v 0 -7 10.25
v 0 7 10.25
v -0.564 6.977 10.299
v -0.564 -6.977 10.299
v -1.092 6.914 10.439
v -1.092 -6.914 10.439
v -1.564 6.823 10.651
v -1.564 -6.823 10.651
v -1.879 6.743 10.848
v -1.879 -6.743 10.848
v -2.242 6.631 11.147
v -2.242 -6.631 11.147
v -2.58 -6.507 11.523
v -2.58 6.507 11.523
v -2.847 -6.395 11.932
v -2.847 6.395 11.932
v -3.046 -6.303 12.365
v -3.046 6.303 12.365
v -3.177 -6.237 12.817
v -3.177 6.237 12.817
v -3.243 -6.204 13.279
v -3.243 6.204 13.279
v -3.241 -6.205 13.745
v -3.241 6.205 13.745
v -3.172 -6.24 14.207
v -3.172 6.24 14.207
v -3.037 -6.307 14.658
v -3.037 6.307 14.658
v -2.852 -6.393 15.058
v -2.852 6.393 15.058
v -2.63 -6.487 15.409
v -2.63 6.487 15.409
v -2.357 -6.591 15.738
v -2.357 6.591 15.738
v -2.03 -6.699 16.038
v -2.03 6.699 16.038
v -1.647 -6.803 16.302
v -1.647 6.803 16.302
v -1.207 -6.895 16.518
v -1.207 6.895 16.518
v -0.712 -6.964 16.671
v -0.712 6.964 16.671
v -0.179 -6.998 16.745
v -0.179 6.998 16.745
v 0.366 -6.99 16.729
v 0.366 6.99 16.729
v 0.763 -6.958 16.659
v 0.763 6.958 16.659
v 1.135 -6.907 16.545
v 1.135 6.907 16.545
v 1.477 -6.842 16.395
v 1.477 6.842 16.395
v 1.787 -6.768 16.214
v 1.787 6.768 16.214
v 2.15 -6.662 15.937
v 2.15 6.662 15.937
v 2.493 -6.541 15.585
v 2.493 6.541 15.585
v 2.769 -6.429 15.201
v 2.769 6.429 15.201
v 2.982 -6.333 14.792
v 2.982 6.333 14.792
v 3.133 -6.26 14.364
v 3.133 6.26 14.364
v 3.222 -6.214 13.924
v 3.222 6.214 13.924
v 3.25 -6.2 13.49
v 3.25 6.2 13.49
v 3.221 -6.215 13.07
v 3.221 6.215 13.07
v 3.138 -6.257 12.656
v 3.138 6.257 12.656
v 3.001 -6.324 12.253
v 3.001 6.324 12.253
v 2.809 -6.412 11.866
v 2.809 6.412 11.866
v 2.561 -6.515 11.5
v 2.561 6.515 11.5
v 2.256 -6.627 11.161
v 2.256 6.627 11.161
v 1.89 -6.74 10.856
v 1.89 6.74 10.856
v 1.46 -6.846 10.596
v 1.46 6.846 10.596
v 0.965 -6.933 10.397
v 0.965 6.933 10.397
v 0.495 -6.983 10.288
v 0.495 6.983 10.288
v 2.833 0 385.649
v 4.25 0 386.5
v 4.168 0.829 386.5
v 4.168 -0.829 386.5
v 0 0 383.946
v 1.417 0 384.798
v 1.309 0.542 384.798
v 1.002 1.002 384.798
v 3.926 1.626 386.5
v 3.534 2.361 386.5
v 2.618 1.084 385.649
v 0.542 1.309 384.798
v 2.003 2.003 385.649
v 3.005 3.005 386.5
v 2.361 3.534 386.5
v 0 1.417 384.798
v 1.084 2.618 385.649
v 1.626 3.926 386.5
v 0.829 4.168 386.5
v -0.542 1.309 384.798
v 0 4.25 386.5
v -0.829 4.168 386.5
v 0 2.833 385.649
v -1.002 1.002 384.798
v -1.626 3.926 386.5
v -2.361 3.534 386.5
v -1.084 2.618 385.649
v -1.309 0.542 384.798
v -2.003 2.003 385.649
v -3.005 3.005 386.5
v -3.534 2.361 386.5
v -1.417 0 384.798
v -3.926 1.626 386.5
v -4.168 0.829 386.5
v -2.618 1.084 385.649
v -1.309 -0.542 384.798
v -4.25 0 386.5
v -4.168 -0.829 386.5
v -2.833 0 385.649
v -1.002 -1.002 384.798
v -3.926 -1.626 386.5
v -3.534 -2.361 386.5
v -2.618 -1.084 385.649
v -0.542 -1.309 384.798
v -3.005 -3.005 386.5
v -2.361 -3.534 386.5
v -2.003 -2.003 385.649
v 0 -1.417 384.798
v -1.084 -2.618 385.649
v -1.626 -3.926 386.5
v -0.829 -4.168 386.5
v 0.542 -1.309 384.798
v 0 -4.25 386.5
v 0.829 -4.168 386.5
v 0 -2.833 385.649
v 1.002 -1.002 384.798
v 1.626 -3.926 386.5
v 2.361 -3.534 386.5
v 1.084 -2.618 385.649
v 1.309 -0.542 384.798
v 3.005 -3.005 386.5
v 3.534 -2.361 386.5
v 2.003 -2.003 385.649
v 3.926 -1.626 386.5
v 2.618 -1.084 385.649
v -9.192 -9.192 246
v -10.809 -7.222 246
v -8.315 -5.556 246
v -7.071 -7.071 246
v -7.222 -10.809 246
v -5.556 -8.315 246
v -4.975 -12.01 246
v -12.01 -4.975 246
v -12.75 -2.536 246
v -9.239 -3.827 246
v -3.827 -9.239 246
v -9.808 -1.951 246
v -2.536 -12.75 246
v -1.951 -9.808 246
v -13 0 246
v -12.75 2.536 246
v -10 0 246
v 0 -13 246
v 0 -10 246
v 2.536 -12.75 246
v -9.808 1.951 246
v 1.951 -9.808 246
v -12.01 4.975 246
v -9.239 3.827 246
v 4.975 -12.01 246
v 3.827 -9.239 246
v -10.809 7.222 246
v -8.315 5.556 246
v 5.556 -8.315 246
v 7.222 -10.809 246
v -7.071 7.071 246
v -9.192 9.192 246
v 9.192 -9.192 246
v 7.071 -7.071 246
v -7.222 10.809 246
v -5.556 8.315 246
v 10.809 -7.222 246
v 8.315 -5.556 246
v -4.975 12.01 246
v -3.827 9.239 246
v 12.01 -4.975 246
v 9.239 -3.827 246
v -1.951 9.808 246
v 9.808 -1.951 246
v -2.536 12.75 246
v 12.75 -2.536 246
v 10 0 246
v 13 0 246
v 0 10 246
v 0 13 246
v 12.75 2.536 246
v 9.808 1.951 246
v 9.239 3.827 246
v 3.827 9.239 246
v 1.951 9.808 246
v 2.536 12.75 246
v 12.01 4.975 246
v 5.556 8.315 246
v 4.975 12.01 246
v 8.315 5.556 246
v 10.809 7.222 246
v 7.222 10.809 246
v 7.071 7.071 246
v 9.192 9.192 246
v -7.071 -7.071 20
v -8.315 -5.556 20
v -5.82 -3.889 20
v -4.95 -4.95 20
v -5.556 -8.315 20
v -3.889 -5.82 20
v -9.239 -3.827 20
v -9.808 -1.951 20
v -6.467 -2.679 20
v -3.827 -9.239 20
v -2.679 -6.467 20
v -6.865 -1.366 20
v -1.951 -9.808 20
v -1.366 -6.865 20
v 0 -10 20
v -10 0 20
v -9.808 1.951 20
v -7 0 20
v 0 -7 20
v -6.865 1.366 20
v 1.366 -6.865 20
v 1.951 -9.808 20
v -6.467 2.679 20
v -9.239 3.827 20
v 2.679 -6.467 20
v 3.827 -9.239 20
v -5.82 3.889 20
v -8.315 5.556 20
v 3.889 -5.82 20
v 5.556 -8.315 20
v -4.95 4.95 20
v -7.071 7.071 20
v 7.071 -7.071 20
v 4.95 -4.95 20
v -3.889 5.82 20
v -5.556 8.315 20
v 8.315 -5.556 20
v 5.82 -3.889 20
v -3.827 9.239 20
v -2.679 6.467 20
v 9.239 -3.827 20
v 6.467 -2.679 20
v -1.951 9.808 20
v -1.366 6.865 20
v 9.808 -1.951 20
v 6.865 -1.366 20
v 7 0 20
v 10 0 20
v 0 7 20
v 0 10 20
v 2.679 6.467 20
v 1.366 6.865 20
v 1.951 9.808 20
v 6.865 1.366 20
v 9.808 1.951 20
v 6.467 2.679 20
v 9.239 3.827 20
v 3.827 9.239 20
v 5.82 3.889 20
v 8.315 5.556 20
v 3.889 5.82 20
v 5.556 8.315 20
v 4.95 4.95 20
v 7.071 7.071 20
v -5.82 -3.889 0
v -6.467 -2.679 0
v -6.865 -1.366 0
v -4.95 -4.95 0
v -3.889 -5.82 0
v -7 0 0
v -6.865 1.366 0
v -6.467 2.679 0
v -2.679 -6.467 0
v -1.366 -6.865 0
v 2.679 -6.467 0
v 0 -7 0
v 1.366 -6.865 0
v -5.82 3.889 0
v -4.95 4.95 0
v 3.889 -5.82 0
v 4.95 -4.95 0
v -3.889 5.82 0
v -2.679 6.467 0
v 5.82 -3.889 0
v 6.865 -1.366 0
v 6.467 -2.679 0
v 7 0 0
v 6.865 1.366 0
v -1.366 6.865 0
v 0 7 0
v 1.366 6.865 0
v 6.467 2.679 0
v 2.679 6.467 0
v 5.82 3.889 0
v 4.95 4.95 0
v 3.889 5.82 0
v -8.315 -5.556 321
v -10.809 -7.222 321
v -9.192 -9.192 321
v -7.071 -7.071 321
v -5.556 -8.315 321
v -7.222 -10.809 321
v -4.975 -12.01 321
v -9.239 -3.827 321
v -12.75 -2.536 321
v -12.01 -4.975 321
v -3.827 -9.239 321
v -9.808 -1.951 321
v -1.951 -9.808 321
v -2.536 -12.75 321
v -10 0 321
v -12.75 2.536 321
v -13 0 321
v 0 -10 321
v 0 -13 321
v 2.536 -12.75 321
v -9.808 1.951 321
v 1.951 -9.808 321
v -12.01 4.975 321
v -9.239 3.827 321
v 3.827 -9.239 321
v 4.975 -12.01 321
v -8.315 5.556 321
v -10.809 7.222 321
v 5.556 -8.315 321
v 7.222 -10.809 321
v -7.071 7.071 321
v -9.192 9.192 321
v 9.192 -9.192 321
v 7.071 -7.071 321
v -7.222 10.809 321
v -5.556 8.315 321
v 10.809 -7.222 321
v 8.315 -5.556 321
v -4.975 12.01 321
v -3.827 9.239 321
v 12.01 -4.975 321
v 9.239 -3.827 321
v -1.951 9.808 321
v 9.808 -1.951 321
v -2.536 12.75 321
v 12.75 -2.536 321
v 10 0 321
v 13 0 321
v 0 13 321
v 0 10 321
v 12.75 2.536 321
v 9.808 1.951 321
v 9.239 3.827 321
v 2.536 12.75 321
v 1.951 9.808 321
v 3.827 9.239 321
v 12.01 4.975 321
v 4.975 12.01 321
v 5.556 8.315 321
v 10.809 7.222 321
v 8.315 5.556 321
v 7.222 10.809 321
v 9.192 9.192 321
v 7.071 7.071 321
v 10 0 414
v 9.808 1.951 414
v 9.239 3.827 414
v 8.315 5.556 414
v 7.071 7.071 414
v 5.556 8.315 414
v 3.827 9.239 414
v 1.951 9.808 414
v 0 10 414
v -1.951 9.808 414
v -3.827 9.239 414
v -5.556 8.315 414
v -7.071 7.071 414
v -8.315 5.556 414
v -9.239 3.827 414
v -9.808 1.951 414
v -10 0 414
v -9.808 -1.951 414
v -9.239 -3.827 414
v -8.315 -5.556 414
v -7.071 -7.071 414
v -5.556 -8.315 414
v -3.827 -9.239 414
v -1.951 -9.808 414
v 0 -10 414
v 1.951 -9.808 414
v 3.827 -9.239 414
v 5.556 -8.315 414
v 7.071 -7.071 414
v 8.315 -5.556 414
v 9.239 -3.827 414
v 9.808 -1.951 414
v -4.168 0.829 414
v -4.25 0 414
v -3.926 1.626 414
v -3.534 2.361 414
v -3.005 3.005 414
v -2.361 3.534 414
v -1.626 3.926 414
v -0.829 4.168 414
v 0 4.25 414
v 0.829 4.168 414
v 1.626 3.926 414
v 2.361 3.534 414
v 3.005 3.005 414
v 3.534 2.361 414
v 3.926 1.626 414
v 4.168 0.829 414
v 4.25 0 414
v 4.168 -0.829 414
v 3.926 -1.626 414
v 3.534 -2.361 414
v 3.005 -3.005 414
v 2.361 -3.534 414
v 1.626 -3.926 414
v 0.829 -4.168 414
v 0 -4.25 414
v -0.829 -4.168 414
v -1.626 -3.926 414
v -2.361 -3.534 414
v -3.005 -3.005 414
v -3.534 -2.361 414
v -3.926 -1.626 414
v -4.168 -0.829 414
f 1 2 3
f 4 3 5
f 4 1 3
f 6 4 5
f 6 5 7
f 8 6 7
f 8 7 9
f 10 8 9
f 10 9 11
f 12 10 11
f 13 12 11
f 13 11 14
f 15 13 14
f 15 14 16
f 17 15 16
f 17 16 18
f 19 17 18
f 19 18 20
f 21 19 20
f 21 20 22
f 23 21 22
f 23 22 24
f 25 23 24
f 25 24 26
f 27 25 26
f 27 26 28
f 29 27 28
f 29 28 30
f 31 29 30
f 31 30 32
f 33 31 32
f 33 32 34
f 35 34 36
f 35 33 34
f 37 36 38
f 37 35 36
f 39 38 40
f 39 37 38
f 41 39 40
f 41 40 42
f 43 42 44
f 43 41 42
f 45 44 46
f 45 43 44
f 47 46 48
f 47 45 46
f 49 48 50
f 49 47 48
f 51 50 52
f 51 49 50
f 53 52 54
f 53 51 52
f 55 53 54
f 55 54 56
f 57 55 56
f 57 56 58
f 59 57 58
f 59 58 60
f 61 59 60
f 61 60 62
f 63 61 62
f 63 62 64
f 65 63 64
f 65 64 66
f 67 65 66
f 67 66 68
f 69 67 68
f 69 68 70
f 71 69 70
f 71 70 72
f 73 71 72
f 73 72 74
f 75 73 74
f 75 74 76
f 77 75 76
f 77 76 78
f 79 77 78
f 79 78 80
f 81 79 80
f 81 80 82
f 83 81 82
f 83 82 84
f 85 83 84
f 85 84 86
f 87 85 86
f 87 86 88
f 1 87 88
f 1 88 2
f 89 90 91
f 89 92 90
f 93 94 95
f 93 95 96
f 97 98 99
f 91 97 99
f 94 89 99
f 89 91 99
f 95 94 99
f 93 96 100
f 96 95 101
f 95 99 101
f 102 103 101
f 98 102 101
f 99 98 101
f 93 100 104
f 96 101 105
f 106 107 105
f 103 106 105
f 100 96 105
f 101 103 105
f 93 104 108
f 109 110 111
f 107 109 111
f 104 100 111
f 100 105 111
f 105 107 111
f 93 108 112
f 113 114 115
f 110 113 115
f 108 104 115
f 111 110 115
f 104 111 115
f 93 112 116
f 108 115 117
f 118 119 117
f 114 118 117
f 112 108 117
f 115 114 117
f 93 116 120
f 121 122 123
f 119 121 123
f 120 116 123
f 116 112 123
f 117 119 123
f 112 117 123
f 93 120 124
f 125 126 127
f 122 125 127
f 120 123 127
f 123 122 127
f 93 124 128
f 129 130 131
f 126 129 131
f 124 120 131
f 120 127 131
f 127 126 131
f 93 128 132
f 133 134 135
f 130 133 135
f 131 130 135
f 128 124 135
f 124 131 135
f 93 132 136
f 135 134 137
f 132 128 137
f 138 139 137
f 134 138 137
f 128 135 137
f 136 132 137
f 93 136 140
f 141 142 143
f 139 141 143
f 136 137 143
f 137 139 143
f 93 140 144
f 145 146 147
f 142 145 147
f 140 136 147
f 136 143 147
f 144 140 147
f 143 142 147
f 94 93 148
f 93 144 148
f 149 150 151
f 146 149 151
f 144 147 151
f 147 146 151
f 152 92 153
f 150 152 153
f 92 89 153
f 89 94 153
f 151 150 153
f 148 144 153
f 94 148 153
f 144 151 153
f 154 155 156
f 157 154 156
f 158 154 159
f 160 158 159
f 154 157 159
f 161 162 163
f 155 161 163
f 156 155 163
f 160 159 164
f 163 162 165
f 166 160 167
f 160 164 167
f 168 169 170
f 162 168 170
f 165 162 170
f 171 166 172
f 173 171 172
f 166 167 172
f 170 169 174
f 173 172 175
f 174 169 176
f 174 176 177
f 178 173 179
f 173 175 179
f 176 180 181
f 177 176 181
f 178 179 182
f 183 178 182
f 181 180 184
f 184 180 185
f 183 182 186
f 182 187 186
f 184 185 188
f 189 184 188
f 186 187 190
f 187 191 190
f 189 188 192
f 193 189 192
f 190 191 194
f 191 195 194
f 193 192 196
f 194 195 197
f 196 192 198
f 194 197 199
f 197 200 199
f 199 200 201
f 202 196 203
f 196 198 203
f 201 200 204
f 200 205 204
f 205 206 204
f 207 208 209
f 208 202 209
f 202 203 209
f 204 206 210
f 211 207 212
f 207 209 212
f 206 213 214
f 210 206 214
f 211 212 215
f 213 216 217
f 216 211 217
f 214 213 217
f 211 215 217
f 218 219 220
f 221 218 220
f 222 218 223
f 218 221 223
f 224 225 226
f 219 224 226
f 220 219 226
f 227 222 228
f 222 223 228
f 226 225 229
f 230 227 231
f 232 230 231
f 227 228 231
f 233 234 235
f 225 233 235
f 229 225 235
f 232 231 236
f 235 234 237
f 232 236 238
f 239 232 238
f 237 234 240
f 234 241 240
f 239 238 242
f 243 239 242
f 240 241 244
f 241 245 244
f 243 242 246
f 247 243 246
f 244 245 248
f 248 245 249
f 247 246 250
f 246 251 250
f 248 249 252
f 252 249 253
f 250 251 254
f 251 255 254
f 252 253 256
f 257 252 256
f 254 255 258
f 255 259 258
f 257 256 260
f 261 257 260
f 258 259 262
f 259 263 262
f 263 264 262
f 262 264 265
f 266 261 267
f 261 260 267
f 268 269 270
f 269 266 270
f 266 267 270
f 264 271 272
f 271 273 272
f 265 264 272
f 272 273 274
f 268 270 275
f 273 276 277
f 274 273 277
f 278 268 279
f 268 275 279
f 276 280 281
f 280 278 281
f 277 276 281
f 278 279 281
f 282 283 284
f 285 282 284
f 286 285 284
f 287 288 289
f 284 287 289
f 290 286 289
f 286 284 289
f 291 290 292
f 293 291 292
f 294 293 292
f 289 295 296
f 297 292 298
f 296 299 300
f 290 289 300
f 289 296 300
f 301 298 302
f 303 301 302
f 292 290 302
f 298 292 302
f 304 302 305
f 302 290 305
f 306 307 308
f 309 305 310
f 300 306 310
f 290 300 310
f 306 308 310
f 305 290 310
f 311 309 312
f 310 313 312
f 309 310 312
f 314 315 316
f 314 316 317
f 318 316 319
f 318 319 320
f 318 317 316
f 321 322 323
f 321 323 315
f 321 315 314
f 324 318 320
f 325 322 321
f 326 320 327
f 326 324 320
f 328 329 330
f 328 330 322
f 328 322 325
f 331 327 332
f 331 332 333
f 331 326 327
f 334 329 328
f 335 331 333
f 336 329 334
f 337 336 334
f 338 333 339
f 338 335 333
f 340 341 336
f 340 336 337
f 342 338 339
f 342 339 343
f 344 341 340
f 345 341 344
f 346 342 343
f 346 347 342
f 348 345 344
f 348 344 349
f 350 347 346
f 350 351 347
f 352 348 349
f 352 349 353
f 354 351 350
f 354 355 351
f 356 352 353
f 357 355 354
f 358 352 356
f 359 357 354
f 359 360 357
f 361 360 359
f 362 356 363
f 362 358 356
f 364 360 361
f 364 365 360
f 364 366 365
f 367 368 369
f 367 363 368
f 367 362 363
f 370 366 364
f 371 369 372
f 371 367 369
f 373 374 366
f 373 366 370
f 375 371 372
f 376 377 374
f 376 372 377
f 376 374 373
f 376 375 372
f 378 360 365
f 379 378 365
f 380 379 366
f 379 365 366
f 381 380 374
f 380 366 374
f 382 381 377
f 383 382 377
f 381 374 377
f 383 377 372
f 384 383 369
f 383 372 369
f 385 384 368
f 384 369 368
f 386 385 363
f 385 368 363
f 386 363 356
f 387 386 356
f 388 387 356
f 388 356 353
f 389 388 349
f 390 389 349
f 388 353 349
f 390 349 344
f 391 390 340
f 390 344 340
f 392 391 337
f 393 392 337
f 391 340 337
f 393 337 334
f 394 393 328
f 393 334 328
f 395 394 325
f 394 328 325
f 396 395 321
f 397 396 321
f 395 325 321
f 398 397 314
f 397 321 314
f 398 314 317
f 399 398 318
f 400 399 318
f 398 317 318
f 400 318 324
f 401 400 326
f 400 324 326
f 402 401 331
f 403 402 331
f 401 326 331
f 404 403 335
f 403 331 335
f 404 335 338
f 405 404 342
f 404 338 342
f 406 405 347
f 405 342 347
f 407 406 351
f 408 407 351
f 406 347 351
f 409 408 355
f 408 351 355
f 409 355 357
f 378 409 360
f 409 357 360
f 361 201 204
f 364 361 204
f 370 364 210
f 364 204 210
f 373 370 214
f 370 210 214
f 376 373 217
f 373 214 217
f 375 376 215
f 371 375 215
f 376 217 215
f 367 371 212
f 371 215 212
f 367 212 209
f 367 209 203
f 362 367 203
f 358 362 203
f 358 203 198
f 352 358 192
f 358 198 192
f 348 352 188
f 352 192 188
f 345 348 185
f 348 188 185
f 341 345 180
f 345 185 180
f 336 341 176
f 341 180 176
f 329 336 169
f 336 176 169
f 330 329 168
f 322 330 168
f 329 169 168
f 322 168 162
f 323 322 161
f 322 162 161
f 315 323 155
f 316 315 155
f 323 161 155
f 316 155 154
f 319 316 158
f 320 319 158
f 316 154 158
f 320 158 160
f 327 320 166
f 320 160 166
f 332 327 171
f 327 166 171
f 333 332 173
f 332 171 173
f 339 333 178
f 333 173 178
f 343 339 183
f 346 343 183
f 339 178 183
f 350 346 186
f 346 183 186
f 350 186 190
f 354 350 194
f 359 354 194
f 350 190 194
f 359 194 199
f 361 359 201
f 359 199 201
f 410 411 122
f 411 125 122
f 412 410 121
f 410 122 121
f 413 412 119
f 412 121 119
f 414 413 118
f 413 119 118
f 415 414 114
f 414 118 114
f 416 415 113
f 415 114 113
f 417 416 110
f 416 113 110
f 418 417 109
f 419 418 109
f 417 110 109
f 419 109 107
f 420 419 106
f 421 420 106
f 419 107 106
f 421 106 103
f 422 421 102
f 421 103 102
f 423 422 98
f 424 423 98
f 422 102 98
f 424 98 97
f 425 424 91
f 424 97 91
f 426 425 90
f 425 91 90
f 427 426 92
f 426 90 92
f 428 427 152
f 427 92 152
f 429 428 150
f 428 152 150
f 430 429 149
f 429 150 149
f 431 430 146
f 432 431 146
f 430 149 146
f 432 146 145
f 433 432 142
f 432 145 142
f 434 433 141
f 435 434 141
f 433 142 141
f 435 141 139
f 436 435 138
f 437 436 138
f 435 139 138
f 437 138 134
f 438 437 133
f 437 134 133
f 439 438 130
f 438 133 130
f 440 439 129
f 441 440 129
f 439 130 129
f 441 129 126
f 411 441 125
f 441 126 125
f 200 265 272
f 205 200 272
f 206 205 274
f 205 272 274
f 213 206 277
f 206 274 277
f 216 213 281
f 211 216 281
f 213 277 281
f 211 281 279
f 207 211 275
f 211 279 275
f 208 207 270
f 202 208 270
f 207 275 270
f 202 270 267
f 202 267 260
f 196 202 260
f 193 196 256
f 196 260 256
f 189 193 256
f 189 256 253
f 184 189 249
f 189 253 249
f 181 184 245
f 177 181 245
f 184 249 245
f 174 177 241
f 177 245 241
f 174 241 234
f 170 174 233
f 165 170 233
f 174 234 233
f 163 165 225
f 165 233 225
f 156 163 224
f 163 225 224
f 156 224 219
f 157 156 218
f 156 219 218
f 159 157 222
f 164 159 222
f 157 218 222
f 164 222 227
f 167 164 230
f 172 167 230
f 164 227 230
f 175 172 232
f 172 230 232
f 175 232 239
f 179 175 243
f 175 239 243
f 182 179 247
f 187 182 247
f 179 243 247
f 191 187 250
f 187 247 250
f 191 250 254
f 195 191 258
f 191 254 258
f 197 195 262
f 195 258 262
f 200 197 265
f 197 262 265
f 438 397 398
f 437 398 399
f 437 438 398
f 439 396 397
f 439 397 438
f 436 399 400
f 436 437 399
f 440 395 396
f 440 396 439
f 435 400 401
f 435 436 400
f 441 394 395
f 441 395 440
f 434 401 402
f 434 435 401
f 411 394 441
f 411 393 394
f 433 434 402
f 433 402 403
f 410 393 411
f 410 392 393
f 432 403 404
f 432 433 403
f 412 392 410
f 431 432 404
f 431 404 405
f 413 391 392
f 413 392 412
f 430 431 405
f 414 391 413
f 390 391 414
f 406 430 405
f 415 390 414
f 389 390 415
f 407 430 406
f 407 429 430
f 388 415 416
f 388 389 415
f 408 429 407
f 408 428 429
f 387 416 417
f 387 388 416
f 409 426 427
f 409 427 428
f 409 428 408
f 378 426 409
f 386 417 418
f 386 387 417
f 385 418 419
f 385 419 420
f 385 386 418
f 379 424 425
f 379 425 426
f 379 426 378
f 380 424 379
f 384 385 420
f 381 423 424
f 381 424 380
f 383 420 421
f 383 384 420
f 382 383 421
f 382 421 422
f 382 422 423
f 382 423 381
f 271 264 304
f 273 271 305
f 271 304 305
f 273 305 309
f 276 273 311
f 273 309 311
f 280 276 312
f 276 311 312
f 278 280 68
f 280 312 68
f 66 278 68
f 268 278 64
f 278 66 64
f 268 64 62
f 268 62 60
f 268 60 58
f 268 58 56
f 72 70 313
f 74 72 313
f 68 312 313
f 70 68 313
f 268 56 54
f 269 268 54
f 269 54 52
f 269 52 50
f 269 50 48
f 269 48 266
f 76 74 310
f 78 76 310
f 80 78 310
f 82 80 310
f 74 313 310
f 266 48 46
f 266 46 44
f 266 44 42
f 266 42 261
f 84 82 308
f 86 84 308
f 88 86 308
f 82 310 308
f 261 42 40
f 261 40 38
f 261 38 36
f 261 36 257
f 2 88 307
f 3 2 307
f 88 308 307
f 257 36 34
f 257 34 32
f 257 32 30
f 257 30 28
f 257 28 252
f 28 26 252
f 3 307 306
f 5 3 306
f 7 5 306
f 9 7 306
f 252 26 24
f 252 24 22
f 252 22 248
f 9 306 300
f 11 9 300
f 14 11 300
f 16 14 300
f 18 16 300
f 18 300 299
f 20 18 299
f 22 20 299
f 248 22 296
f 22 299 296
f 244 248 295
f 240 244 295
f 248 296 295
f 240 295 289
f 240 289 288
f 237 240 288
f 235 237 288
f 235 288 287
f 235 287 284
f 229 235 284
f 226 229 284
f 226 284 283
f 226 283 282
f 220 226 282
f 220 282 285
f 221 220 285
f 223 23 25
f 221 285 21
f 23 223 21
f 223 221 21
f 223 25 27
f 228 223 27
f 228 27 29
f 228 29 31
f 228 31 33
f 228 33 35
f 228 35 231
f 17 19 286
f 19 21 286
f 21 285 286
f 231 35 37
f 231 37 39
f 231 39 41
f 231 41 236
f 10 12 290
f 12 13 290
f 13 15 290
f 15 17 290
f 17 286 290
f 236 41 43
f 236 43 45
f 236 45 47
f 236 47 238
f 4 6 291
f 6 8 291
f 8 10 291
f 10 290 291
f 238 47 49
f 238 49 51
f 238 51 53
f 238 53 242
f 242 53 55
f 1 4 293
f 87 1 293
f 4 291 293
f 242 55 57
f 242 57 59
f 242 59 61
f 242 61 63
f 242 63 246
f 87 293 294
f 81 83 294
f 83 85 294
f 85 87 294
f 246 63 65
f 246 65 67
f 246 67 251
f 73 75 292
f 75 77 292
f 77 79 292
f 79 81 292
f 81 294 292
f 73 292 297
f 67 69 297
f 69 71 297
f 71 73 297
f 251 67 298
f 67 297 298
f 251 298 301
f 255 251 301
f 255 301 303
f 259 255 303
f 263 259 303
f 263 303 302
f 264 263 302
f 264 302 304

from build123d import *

# Parameters (mm, degrees)
SCHIZZO1_R                    = 7
ESTRUSIONE1_DEPTH             = 20
SCHIZZO2_R                    = 10
ESTRUSIONE2_DEPTH             = 226
SCHIZZO6_R                    = 13
ESTRUSIONE_ESTRUSIONE1_DEPTH  = 75
SCHIZZO7_R                    = 10
ESTRUSIONE_ESTRUSIONE2_DEPTH  = 93
FORO_FILETTATO_M10_1_D        = 8.5
FORO_FILETTATO_M10_1_DEPTH    = 27.5
FORO_FILETTATO_M10_1_TIP      = 2.553657631
TAGLIO_ESTRUSIONE1_DEPTH      = 10
TAGLIO_ESTRUSIONE1_DEPTH_BACK = 10
SCHIZZO10_R                   = 3.25


with BuildPart() as part:
    # Schizzo1 → Estrusione1 (new body)
    with BuildSketch(Plane.XY):
        Circle(SCHIZZO1_R)
    extrude(amount=ESTRUSIONE1_DEPTH)

    # Schizzo2 → Estrusione2 (add)
    with BuildSketch(Plane.XY.offset(20)):
        Circle(SCHIZZO2_R)
    extrude(amount=ESTRUSIONE2_DEPTH)

    # Schizzo6 → Estrusione-Estrusione1 (add)
    with BuildSketch(Plane.XY.offset(246)):
        Circle(SCHIZZO6_R)
    extrude(amount=ESTRUSIONE_ESTRUSIONE1_DEPTH)

    # Schizzo7 → Estrusione-Estrusione2 (add)
    with BuildSketch(Plane.XY.offset(321)):
        Circle(SCHIZZO7_R)
    extrude(amount=ESTRUSIONE_ESTRUSIONE2_DEPTH)

    # Foro filettato M10-1
    with Locations(Plane.XY.offset(414)):
        with Locations((0, 0)):
            Hole(FORO_FILETTATO_M10_1_D / 2, depth=FORO_FILETTATO_M10_1_DEPTH)
            with Locations((0, 0, -(FORO_FILETTATO_M10_1_DEPTH + FORO_FILETTATO_M10_1_TIP / 2))):  # 118° drill point
                Cone(0, FORO_FILETTATO_M10_1_D / 2, FORO_FILETTATO_M10_1_TIP, mode=Mode.SUBTRACT)

    # Schizzo10 → Taglio-Estrusione1 (cut, two sides: drawn at the far end of the back side and taken through both)
    with BuildSketch(Plane(origin=(0, 0, 0), x_dir=(1, 0, 0), z_dir=(0, 1, 0)).offset(-TAGLIO_ESTRUSIONE1_DEPTH_BACK)):
        with Locations((0, -13.5)):
            Circle(SCHIZZO10_R)
    extrude(amount=TAGLIO_ESTRUSIONE1_DEPTH + TAGLIO_ESTRUSIONE1_DEPTH_BACK, mode=Mode.SUBTRACT)


solid = part.part
